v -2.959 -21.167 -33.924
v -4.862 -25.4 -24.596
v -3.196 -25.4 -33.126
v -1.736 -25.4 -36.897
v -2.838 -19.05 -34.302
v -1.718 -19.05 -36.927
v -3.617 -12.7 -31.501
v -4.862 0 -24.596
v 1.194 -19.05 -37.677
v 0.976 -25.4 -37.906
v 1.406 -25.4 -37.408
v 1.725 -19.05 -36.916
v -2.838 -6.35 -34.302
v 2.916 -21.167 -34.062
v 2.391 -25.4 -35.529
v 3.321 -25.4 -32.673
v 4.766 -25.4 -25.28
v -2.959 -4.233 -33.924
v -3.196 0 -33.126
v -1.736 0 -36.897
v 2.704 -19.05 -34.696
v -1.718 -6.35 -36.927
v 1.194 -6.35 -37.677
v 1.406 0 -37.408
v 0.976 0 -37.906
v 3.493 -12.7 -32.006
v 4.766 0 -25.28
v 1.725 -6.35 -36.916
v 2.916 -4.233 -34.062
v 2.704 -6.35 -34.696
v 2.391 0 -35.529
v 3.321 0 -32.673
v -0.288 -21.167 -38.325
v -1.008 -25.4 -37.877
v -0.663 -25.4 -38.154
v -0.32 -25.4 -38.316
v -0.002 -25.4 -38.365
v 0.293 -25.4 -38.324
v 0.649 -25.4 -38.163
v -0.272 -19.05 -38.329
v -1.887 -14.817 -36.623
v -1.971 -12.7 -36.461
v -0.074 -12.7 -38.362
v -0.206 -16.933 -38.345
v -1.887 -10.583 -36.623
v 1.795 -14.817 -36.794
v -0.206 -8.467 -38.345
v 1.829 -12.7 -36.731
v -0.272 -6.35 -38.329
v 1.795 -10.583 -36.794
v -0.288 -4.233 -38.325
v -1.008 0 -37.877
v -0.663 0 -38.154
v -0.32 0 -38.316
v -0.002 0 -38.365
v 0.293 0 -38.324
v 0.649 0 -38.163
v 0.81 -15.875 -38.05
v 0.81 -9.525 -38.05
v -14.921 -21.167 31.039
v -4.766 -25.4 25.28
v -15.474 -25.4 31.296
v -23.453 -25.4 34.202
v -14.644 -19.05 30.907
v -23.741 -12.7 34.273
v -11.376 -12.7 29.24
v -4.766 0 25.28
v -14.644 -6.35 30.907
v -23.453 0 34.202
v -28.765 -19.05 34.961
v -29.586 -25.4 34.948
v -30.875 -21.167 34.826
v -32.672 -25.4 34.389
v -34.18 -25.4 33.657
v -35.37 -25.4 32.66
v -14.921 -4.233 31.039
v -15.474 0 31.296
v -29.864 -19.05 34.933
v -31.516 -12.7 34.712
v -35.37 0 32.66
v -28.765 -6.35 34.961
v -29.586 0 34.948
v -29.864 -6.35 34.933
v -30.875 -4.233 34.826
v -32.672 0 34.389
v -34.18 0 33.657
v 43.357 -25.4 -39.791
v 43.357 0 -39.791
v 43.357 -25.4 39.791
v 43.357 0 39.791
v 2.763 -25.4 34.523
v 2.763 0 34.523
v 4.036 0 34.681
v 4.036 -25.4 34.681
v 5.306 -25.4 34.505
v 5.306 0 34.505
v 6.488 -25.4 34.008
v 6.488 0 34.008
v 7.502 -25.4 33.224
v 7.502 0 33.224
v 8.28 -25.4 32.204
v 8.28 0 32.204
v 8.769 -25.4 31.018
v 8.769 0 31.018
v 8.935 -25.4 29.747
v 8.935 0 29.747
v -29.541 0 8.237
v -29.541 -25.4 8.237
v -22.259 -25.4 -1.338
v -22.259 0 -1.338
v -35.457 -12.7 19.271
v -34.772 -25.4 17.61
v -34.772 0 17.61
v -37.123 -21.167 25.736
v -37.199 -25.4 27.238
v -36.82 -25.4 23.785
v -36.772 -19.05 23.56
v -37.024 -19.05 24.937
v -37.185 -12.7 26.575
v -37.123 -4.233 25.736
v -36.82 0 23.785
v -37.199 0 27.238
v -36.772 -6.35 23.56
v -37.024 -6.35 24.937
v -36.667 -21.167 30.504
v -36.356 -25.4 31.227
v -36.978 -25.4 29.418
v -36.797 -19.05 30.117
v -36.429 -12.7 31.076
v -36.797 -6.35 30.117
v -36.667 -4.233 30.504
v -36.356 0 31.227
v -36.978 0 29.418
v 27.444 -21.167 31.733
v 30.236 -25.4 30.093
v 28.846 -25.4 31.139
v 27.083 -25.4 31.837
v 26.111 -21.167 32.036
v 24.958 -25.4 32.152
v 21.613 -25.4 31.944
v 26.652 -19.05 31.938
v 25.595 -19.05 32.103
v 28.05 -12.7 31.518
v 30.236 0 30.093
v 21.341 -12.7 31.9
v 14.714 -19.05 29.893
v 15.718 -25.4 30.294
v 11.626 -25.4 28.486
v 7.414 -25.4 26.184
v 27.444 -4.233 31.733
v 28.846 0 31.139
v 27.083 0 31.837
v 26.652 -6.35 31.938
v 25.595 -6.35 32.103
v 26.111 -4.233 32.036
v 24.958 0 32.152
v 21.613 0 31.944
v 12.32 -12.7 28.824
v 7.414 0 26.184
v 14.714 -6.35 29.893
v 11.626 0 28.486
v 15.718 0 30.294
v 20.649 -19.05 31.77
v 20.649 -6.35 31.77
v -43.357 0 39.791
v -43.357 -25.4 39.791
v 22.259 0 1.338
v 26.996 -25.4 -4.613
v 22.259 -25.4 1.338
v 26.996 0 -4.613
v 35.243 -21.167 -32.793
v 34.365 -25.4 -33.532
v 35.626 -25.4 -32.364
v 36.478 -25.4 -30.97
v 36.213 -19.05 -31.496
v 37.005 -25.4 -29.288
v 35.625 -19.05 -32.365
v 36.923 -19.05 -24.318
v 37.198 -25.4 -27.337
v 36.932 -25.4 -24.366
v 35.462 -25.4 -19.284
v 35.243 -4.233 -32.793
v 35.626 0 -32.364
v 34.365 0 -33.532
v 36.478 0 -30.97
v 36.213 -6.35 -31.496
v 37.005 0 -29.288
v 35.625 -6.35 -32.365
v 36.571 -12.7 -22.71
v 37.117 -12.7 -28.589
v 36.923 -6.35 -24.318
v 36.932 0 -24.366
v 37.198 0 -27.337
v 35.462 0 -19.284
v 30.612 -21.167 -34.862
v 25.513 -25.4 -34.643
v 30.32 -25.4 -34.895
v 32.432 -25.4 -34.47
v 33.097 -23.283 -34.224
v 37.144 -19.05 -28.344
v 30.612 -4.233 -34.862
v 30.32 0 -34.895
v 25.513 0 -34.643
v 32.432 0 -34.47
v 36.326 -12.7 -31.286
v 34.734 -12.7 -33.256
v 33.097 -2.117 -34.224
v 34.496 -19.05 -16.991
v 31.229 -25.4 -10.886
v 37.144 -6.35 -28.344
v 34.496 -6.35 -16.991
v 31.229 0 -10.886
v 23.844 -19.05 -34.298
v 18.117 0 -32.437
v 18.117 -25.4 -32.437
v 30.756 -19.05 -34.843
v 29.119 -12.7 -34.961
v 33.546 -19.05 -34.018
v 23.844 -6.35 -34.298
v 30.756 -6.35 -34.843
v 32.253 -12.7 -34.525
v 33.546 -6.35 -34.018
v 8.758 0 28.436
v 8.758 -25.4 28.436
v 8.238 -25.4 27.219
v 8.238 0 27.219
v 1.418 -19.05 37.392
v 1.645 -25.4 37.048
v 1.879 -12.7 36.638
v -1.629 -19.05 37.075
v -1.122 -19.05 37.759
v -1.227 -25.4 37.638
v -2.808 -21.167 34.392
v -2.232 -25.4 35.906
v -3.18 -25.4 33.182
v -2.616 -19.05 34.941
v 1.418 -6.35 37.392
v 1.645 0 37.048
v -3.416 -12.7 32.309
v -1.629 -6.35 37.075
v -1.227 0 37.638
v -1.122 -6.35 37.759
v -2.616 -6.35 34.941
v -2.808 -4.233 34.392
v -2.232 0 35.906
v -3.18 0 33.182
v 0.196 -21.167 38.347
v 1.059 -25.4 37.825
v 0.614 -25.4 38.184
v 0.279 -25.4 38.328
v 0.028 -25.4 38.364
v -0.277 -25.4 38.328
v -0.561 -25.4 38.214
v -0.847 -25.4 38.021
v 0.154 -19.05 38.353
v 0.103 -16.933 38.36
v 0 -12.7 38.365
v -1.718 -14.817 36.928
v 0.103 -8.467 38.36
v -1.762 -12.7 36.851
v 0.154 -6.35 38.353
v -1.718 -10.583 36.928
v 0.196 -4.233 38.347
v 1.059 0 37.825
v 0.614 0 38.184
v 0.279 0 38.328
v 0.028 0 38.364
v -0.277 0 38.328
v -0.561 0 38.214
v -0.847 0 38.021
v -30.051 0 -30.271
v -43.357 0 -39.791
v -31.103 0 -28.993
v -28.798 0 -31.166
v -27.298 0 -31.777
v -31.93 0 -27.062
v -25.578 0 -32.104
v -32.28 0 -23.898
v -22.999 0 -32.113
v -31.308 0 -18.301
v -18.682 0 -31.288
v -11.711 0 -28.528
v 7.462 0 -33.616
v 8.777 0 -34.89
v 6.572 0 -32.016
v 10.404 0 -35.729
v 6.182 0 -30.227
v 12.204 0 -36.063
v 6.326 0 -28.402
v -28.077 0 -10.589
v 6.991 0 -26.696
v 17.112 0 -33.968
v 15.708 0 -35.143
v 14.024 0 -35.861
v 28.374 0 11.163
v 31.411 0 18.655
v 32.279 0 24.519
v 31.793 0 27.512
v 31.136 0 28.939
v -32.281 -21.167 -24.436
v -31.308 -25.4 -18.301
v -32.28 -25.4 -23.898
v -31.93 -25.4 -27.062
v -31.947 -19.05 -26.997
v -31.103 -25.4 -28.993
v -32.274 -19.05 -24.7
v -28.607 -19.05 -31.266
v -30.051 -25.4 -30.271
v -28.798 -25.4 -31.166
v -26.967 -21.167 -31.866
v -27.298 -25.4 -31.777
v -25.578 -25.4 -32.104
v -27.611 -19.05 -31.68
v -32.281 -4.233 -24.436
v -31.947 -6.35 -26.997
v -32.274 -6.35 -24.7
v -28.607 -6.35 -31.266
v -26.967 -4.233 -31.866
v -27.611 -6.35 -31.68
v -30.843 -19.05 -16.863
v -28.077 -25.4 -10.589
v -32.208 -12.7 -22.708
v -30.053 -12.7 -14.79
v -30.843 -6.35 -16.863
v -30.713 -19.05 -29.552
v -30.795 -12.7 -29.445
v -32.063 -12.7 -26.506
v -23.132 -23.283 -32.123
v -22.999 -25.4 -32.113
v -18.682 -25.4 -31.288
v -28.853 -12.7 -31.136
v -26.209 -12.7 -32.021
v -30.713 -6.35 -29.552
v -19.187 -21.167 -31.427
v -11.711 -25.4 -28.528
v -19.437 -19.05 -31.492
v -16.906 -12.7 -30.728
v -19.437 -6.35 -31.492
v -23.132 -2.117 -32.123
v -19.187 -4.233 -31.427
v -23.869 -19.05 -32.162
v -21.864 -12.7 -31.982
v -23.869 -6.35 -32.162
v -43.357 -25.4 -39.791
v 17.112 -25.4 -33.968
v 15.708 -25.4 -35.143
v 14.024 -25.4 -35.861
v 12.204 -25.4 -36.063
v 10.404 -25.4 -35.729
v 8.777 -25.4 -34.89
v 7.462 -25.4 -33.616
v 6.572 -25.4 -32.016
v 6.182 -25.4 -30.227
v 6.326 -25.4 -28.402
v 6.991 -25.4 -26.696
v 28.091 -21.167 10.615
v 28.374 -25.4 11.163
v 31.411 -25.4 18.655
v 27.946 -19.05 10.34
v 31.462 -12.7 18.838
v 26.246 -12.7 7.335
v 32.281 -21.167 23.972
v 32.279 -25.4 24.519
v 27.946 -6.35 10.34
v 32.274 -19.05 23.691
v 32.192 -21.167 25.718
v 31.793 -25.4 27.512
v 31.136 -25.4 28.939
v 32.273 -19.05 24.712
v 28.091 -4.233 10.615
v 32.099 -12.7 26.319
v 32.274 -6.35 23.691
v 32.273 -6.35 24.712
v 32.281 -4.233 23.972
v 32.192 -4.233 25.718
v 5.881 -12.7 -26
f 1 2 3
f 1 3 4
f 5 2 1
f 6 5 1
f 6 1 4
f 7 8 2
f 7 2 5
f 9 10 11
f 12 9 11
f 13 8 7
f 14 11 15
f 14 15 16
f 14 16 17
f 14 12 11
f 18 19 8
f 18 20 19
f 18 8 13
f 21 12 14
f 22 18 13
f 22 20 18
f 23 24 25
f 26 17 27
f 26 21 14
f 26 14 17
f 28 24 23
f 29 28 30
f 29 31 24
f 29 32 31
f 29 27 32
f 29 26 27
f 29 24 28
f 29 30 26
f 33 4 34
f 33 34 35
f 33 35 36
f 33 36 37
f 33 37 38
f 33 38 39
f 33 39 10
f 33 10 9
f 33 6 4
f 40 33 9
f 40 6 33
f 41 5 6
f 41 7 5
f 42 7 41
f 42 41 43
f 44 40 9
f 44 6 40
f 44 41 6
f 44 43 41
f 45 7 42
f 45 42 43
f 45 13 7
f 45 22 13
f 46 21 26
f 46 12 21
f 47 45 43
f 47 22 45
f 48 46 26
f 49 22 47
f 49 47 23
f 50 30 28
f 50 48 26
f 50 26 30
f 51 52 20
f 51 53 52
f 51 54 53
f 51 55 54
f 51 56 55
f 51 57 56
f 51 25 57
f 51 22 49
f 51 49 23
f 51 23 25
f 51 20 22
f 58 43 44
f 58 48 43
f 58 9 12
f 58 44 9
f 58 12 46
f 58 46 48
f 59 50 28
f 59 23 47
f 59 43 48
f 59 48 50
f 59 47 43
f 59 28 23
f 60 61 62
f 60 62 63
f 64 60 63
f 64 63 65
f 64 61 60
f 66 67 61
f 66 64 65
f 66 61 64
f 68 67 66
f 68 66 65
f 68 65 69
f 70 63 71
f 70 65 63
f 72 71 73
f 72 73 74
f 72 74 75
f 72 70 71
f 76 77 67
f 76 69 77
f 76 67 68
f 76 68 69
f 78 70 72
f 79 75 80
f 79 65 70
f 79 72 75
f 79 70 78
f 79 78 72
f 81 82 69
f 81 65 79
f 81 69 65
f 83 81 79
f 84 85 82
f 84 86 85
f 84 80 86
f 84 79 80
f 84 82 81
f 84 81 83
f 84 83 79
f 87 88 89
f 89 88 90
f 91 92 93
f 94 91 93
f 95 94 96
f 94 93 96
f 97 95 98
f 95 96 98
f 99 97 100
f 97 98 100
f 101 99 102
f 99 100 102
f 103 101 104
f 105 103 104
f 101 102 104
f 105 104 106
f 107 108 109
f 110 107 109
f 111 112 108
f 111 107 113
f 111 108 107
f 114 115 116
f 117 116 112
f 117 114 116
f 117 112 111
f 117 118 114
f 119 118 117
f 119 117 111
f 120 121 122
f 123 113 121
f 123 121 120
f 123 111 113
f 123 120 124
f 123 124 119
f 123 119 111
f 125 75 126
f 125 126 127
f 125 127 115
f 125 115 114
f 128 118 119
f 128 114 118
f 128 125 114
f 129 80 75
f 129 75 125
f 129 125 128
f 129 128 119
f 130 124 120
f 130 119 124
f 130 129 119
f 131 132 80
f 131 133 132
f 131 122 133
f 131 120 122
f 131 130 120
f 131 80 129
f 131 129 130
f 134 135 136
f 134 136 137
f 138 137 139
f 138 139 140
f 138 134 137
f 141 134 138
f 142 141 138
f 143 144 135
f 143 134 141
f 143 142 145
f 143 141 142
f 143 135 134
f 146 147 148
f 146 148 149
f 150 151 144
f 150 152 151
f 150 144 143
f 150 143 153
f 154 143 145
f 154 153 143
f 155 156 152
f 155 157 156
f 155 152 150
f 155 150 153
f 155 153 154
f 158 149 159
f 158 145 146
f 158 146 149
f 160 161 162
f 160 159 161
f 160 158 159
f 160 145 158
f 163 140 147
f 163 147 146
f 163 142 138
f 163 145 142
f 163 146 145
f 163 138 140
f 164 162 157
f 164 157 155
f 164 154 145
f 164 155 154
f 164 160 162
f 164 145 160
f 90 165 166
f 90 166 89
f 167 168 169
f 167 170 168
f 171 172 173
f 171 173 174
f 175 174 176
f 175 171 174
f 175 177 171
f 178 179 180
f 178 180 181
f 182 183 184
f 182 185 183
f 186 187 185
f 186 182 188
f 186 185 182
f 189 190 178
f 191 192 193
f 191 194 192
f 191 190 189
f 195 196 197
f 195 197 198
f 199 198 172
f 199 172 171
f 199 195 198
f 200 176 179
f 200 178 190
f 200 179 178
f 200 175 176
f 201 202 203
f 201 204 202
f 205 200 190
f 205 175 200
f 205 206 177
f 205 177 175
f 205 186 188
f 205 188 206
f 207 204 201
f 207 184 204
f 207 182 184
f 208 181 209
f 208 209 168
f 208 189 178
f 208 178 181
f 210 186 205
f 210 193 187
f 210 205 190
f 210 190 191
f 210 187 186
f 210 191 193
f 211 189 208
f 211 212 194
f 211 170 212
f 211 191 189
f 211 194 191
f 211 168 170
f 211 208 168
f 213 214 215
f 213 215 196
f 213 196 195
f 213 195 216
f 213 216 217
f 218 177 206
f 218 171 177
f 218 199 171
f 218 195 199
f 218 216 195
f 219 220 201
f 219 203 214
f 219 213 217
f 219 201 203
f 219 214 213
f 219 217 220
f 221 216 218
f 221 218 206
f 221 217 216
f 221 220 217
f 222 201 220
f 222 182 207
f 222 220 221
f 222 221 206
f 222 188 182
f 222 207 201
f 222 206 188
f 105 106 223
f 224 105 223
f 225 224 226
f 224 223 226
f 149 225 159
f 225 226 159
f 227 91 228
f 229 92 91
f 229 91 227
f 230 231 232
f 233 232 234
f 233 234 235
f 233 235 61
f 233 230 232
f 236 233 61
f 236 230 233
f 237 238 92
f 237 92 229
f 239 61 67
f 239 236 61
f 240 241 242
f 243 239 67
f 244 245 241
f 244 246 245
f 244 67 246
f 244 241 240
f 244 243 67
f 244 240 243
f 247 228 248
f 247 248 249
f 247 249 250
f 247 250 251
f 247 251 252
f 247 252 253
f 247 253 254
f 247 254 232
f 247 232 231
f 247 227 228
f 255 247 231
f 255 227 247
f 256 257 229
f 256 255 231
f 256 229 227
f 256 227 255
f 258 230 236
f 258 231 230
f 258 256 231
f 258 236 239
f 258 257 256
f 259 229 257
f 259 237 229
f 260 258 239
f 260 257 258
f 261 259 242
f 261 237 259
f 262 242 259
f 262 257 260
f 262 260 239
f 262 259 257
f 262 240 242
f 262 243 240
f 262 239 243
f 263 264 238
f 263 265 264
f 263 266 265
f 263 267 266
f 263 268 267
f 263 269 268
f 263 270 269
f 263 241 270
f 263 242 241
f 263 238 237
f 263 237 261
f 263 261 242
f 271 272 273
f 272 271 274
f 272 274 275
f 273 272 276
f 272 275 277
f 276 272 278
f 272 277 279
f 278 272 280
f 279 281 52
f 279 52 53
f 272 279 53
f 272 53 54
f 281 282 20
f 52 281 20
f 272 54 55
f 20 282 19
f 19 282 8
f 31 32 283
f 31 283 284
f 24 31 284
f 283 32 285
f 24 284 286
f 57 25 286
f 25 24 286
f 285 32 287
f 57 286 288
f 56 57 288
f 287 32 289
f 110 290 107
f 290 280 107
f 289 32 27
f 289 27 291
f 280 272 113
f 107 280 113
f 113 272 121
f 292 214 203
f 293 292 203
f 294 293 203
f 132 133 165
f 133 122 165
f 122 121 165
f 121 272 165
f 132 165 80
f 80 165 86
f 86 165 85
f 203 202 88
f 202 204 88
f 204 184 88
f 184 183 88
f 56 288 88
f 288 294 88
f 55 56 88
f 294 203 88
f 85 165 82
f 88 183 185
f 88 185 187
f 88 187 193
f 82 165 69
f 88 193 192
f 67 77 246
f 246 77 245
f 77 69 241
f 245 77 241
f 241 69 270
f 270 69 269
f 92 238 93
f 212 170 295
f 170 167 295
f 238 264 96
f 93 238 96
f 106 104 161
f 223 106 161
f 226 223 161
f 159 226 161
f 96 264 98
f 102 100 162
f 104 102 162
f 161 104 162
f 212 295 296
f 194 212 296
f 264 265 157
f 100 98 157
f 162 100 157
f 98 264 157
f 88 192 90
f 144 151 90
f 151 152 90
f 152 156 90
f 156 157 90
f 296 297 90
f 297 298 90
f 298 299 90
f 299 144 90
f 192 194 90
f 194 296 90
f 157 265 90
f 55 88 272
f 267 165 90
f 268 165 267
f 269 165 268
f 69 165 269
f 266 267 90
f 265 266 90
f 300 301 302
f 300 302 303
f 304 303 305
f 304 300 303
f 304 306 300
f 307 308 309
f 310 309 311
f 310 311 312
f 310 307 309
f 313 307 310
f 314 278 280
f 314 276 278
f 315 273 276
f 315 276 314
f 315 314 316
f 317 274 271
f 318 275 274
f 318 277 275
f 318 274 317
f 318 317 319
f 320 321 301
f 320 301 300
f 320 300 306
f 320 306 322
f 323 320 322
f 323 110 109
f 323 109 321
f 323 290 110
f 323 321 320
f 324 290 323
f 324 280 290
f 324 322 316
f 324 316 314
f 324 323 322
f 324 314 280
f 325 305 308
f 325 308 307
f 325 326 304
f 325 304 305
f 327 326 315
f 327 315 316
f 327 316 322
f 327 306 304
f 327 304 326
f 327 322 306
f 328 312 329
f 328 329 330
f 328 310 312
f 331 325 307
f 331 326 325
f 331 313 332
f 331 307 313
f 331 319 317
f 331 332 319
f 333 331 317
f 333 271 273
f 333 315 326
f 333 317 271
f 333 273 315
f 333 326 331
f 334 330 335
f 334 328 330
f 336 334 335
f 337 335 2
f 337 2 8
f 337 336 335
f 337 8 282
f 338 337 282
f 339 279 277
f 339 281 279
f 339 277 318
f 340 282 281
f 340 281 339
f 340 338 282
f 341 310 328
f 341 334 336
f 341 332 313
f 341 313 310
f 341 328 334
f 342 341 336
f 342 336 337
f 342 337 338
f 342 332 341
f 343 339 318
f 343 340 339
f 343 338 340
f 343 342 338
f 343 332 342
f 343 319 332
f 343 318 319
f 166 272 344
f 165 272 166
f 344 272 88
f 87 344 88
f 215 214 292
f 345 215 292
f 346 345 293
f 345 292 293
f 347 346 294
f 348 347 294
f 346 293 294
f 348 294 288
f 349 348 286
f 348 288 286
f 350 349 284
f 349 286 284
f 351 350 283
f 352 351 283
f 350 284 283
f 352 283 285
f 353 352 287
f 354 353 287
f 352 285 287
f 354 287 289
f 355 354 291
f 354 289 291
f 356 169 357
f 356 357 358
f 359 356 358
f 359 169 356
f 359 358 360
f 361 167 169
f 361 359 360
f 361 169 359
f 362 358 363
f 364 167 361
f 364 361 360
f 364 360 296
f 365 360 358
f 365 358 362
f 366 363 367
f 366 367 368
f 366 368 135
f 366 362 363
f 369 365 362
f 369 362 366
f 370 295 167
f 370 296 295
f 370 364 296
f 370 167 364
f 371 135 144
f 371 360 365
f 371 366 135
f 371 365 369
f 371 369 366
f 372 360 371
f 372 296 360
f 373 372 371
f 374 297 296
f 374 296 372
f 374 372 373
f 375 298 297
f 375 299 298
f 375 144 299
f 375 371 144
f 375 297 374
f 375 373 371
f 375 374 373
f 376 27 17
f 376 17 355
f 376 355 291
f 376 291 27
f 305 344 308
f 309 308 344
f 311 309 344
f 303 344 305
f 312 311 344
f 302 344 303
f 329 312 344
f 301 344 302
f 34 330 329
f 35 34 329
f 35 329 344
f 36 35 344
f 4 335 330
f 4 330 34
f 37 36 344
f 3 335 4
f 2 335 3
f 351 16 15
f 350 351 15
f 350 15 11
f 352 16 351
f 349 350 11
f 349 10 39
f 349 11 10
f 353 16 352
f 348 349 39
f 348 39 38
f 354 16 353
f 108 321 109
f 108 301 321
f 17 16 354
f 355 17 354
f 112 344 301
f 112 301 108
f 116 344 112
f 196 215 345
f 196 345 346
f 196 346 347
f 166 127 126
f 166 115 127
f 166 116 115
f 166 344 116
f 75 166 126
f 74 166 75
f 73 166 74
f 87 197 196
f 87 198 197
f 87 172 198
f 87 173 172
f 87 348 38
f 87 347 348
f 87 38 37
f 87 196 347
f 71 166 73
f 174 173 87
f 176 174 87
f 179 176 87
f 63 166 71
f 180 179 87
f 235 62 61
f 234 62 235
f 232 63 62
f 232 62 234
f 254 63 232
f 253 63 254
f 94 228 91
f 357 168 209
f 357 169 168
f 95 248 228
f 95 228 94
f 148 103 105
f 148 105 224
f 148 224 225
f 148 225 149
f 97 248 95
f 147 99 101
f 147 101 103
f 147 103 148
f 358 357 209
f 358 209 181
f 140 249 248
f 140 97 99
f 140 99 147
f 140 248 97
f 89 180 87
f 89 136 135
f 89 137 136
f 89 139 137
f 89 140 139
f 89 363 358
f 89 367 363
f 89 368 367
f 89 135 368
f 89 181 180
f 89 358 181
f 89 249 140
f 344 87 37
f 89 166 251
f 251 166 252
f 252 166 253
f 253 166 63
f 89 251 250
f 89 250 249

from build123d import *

# Parameters (mm, degrees)
F0_W     = 86.713158
F0_H     = 79.58214
F1_DEPTH = 25.4


with BuildPart() as f1:
    # F0 (on Front) → F1 (new body)
    with BuildSketch(Plane.XZ):
        Rectangle(F0_W, F0_H)
        with BuildLine():
            add(Edge.make_bspline(
                [(-35.36984, 32.660052), (-43.630681, 23.713813), (-22.259437, -1.337829)],
                knots=[0, 0, 0, 1.244177, 1.244177, 1.244177], degree=2, weights=[1, 0.812663, 1]))
            add(Edge.make_bspline(
                [(-4.765757, 25.279926), (-28.087234, 40.546892), (-35.36984, 32.660052)],
                knots=[5.155733, 5.155733, 5.155733, 6.283185, 6.283185, 6.283185], degree=2, weights=[1, 0.84527, 1]))
            add(Edge.make_bspline(
                [(0, 38.364865), (-2.872782, 38.364865), (-4.765757, 25.279926)],
                knots=[0, 0, 0, 0.851395, 0.851395, 0.851395], degree=2, weights=[1, 0.910751, 1]))
            add(Edge.make_bspline(
                [(2.763368, 34.523458), (1.454502, 38.364865), (0, 38.364865)],
                knots=[5.831864, 5.831864, 5.831864, 6.283185, 6.283185, 6.283185], degree=2, weights=[1, 0.974647, 1]))
            ThreePointArc((2.763368, 34.523458), (7.020907, 33.649159), (8.935218, 29.747051))
            ThreePointArc((8.935218, 29.747051), (8.539057, 27.809914), (7.41419, 26.183841))
            add(Edge.make_bspline(
                [(30.235512, 30.092888), (24.193663, 36.163372), (7.41419, 26.183841)],
                knots=[0, 0, 0, 0.981014, 0.981014, 0.981014], degree=2, weights=[1, 0.882094, 1]))
            add(Edge.make_bspline(
                [(22.259437, 1.337829), (37.712849, 22.580113), (30.235512, 30.092888)],
                knots=[5.115155, 5.115155, 5.115155, 6.283185, 6.283185, 6.283185], degree=2, weights=[1, 0.834256, 1]))
            add(Edge.make_bspline(
                [(18.116728, -32.437346), (68.240774, -52.562076), (22.259437, 1.337829)],
                knots=[2.394352, 2.394352, 2.394352, 4.38577, 4.38577, 4.38577], degree=2, weights=[1, 0.543908, 1]))
            ThreePointArc((18.116728, -32.437346), (9.559764, -35.369126), (6.991325, -26.696173))
            add(Edge.make_bspline(
                [(4.765757, -25.279926), (5.883942, -26.011924), (6.991325, -26.696173)],
                knots=[2.01414, 2.01414, 2.01414, 2.074741, 2.074741, 2.074741], degree=2, weights=[1, 0.999541, 1]))
            add(Edge.make_bspline(
                [(-4.862435, -24.595616), (-0.11439, -59.013299), (4.765757, -25.279926)],
                knots=[2.266724, 2.266724, 2.266724, 3.992988, 3.992988, 3.992988], degree=2, weights=[1, 0.650061, 1]))
            add(Edge.make_bspline(
                [(-22.259437, -1.337829), (-69.92987, -66.86568), (-4.862435, -24.595616)],
                knots=[1.973562, 1.973562, 1.973562, 4.203143, 4.203143, 4.203143], degree=2, weights=[1, 0.440366, 1]))
        make_face(mode=Mode.SUBTRACT)
    extrude(amount=F1_DEPTH)


solid = f1.part
